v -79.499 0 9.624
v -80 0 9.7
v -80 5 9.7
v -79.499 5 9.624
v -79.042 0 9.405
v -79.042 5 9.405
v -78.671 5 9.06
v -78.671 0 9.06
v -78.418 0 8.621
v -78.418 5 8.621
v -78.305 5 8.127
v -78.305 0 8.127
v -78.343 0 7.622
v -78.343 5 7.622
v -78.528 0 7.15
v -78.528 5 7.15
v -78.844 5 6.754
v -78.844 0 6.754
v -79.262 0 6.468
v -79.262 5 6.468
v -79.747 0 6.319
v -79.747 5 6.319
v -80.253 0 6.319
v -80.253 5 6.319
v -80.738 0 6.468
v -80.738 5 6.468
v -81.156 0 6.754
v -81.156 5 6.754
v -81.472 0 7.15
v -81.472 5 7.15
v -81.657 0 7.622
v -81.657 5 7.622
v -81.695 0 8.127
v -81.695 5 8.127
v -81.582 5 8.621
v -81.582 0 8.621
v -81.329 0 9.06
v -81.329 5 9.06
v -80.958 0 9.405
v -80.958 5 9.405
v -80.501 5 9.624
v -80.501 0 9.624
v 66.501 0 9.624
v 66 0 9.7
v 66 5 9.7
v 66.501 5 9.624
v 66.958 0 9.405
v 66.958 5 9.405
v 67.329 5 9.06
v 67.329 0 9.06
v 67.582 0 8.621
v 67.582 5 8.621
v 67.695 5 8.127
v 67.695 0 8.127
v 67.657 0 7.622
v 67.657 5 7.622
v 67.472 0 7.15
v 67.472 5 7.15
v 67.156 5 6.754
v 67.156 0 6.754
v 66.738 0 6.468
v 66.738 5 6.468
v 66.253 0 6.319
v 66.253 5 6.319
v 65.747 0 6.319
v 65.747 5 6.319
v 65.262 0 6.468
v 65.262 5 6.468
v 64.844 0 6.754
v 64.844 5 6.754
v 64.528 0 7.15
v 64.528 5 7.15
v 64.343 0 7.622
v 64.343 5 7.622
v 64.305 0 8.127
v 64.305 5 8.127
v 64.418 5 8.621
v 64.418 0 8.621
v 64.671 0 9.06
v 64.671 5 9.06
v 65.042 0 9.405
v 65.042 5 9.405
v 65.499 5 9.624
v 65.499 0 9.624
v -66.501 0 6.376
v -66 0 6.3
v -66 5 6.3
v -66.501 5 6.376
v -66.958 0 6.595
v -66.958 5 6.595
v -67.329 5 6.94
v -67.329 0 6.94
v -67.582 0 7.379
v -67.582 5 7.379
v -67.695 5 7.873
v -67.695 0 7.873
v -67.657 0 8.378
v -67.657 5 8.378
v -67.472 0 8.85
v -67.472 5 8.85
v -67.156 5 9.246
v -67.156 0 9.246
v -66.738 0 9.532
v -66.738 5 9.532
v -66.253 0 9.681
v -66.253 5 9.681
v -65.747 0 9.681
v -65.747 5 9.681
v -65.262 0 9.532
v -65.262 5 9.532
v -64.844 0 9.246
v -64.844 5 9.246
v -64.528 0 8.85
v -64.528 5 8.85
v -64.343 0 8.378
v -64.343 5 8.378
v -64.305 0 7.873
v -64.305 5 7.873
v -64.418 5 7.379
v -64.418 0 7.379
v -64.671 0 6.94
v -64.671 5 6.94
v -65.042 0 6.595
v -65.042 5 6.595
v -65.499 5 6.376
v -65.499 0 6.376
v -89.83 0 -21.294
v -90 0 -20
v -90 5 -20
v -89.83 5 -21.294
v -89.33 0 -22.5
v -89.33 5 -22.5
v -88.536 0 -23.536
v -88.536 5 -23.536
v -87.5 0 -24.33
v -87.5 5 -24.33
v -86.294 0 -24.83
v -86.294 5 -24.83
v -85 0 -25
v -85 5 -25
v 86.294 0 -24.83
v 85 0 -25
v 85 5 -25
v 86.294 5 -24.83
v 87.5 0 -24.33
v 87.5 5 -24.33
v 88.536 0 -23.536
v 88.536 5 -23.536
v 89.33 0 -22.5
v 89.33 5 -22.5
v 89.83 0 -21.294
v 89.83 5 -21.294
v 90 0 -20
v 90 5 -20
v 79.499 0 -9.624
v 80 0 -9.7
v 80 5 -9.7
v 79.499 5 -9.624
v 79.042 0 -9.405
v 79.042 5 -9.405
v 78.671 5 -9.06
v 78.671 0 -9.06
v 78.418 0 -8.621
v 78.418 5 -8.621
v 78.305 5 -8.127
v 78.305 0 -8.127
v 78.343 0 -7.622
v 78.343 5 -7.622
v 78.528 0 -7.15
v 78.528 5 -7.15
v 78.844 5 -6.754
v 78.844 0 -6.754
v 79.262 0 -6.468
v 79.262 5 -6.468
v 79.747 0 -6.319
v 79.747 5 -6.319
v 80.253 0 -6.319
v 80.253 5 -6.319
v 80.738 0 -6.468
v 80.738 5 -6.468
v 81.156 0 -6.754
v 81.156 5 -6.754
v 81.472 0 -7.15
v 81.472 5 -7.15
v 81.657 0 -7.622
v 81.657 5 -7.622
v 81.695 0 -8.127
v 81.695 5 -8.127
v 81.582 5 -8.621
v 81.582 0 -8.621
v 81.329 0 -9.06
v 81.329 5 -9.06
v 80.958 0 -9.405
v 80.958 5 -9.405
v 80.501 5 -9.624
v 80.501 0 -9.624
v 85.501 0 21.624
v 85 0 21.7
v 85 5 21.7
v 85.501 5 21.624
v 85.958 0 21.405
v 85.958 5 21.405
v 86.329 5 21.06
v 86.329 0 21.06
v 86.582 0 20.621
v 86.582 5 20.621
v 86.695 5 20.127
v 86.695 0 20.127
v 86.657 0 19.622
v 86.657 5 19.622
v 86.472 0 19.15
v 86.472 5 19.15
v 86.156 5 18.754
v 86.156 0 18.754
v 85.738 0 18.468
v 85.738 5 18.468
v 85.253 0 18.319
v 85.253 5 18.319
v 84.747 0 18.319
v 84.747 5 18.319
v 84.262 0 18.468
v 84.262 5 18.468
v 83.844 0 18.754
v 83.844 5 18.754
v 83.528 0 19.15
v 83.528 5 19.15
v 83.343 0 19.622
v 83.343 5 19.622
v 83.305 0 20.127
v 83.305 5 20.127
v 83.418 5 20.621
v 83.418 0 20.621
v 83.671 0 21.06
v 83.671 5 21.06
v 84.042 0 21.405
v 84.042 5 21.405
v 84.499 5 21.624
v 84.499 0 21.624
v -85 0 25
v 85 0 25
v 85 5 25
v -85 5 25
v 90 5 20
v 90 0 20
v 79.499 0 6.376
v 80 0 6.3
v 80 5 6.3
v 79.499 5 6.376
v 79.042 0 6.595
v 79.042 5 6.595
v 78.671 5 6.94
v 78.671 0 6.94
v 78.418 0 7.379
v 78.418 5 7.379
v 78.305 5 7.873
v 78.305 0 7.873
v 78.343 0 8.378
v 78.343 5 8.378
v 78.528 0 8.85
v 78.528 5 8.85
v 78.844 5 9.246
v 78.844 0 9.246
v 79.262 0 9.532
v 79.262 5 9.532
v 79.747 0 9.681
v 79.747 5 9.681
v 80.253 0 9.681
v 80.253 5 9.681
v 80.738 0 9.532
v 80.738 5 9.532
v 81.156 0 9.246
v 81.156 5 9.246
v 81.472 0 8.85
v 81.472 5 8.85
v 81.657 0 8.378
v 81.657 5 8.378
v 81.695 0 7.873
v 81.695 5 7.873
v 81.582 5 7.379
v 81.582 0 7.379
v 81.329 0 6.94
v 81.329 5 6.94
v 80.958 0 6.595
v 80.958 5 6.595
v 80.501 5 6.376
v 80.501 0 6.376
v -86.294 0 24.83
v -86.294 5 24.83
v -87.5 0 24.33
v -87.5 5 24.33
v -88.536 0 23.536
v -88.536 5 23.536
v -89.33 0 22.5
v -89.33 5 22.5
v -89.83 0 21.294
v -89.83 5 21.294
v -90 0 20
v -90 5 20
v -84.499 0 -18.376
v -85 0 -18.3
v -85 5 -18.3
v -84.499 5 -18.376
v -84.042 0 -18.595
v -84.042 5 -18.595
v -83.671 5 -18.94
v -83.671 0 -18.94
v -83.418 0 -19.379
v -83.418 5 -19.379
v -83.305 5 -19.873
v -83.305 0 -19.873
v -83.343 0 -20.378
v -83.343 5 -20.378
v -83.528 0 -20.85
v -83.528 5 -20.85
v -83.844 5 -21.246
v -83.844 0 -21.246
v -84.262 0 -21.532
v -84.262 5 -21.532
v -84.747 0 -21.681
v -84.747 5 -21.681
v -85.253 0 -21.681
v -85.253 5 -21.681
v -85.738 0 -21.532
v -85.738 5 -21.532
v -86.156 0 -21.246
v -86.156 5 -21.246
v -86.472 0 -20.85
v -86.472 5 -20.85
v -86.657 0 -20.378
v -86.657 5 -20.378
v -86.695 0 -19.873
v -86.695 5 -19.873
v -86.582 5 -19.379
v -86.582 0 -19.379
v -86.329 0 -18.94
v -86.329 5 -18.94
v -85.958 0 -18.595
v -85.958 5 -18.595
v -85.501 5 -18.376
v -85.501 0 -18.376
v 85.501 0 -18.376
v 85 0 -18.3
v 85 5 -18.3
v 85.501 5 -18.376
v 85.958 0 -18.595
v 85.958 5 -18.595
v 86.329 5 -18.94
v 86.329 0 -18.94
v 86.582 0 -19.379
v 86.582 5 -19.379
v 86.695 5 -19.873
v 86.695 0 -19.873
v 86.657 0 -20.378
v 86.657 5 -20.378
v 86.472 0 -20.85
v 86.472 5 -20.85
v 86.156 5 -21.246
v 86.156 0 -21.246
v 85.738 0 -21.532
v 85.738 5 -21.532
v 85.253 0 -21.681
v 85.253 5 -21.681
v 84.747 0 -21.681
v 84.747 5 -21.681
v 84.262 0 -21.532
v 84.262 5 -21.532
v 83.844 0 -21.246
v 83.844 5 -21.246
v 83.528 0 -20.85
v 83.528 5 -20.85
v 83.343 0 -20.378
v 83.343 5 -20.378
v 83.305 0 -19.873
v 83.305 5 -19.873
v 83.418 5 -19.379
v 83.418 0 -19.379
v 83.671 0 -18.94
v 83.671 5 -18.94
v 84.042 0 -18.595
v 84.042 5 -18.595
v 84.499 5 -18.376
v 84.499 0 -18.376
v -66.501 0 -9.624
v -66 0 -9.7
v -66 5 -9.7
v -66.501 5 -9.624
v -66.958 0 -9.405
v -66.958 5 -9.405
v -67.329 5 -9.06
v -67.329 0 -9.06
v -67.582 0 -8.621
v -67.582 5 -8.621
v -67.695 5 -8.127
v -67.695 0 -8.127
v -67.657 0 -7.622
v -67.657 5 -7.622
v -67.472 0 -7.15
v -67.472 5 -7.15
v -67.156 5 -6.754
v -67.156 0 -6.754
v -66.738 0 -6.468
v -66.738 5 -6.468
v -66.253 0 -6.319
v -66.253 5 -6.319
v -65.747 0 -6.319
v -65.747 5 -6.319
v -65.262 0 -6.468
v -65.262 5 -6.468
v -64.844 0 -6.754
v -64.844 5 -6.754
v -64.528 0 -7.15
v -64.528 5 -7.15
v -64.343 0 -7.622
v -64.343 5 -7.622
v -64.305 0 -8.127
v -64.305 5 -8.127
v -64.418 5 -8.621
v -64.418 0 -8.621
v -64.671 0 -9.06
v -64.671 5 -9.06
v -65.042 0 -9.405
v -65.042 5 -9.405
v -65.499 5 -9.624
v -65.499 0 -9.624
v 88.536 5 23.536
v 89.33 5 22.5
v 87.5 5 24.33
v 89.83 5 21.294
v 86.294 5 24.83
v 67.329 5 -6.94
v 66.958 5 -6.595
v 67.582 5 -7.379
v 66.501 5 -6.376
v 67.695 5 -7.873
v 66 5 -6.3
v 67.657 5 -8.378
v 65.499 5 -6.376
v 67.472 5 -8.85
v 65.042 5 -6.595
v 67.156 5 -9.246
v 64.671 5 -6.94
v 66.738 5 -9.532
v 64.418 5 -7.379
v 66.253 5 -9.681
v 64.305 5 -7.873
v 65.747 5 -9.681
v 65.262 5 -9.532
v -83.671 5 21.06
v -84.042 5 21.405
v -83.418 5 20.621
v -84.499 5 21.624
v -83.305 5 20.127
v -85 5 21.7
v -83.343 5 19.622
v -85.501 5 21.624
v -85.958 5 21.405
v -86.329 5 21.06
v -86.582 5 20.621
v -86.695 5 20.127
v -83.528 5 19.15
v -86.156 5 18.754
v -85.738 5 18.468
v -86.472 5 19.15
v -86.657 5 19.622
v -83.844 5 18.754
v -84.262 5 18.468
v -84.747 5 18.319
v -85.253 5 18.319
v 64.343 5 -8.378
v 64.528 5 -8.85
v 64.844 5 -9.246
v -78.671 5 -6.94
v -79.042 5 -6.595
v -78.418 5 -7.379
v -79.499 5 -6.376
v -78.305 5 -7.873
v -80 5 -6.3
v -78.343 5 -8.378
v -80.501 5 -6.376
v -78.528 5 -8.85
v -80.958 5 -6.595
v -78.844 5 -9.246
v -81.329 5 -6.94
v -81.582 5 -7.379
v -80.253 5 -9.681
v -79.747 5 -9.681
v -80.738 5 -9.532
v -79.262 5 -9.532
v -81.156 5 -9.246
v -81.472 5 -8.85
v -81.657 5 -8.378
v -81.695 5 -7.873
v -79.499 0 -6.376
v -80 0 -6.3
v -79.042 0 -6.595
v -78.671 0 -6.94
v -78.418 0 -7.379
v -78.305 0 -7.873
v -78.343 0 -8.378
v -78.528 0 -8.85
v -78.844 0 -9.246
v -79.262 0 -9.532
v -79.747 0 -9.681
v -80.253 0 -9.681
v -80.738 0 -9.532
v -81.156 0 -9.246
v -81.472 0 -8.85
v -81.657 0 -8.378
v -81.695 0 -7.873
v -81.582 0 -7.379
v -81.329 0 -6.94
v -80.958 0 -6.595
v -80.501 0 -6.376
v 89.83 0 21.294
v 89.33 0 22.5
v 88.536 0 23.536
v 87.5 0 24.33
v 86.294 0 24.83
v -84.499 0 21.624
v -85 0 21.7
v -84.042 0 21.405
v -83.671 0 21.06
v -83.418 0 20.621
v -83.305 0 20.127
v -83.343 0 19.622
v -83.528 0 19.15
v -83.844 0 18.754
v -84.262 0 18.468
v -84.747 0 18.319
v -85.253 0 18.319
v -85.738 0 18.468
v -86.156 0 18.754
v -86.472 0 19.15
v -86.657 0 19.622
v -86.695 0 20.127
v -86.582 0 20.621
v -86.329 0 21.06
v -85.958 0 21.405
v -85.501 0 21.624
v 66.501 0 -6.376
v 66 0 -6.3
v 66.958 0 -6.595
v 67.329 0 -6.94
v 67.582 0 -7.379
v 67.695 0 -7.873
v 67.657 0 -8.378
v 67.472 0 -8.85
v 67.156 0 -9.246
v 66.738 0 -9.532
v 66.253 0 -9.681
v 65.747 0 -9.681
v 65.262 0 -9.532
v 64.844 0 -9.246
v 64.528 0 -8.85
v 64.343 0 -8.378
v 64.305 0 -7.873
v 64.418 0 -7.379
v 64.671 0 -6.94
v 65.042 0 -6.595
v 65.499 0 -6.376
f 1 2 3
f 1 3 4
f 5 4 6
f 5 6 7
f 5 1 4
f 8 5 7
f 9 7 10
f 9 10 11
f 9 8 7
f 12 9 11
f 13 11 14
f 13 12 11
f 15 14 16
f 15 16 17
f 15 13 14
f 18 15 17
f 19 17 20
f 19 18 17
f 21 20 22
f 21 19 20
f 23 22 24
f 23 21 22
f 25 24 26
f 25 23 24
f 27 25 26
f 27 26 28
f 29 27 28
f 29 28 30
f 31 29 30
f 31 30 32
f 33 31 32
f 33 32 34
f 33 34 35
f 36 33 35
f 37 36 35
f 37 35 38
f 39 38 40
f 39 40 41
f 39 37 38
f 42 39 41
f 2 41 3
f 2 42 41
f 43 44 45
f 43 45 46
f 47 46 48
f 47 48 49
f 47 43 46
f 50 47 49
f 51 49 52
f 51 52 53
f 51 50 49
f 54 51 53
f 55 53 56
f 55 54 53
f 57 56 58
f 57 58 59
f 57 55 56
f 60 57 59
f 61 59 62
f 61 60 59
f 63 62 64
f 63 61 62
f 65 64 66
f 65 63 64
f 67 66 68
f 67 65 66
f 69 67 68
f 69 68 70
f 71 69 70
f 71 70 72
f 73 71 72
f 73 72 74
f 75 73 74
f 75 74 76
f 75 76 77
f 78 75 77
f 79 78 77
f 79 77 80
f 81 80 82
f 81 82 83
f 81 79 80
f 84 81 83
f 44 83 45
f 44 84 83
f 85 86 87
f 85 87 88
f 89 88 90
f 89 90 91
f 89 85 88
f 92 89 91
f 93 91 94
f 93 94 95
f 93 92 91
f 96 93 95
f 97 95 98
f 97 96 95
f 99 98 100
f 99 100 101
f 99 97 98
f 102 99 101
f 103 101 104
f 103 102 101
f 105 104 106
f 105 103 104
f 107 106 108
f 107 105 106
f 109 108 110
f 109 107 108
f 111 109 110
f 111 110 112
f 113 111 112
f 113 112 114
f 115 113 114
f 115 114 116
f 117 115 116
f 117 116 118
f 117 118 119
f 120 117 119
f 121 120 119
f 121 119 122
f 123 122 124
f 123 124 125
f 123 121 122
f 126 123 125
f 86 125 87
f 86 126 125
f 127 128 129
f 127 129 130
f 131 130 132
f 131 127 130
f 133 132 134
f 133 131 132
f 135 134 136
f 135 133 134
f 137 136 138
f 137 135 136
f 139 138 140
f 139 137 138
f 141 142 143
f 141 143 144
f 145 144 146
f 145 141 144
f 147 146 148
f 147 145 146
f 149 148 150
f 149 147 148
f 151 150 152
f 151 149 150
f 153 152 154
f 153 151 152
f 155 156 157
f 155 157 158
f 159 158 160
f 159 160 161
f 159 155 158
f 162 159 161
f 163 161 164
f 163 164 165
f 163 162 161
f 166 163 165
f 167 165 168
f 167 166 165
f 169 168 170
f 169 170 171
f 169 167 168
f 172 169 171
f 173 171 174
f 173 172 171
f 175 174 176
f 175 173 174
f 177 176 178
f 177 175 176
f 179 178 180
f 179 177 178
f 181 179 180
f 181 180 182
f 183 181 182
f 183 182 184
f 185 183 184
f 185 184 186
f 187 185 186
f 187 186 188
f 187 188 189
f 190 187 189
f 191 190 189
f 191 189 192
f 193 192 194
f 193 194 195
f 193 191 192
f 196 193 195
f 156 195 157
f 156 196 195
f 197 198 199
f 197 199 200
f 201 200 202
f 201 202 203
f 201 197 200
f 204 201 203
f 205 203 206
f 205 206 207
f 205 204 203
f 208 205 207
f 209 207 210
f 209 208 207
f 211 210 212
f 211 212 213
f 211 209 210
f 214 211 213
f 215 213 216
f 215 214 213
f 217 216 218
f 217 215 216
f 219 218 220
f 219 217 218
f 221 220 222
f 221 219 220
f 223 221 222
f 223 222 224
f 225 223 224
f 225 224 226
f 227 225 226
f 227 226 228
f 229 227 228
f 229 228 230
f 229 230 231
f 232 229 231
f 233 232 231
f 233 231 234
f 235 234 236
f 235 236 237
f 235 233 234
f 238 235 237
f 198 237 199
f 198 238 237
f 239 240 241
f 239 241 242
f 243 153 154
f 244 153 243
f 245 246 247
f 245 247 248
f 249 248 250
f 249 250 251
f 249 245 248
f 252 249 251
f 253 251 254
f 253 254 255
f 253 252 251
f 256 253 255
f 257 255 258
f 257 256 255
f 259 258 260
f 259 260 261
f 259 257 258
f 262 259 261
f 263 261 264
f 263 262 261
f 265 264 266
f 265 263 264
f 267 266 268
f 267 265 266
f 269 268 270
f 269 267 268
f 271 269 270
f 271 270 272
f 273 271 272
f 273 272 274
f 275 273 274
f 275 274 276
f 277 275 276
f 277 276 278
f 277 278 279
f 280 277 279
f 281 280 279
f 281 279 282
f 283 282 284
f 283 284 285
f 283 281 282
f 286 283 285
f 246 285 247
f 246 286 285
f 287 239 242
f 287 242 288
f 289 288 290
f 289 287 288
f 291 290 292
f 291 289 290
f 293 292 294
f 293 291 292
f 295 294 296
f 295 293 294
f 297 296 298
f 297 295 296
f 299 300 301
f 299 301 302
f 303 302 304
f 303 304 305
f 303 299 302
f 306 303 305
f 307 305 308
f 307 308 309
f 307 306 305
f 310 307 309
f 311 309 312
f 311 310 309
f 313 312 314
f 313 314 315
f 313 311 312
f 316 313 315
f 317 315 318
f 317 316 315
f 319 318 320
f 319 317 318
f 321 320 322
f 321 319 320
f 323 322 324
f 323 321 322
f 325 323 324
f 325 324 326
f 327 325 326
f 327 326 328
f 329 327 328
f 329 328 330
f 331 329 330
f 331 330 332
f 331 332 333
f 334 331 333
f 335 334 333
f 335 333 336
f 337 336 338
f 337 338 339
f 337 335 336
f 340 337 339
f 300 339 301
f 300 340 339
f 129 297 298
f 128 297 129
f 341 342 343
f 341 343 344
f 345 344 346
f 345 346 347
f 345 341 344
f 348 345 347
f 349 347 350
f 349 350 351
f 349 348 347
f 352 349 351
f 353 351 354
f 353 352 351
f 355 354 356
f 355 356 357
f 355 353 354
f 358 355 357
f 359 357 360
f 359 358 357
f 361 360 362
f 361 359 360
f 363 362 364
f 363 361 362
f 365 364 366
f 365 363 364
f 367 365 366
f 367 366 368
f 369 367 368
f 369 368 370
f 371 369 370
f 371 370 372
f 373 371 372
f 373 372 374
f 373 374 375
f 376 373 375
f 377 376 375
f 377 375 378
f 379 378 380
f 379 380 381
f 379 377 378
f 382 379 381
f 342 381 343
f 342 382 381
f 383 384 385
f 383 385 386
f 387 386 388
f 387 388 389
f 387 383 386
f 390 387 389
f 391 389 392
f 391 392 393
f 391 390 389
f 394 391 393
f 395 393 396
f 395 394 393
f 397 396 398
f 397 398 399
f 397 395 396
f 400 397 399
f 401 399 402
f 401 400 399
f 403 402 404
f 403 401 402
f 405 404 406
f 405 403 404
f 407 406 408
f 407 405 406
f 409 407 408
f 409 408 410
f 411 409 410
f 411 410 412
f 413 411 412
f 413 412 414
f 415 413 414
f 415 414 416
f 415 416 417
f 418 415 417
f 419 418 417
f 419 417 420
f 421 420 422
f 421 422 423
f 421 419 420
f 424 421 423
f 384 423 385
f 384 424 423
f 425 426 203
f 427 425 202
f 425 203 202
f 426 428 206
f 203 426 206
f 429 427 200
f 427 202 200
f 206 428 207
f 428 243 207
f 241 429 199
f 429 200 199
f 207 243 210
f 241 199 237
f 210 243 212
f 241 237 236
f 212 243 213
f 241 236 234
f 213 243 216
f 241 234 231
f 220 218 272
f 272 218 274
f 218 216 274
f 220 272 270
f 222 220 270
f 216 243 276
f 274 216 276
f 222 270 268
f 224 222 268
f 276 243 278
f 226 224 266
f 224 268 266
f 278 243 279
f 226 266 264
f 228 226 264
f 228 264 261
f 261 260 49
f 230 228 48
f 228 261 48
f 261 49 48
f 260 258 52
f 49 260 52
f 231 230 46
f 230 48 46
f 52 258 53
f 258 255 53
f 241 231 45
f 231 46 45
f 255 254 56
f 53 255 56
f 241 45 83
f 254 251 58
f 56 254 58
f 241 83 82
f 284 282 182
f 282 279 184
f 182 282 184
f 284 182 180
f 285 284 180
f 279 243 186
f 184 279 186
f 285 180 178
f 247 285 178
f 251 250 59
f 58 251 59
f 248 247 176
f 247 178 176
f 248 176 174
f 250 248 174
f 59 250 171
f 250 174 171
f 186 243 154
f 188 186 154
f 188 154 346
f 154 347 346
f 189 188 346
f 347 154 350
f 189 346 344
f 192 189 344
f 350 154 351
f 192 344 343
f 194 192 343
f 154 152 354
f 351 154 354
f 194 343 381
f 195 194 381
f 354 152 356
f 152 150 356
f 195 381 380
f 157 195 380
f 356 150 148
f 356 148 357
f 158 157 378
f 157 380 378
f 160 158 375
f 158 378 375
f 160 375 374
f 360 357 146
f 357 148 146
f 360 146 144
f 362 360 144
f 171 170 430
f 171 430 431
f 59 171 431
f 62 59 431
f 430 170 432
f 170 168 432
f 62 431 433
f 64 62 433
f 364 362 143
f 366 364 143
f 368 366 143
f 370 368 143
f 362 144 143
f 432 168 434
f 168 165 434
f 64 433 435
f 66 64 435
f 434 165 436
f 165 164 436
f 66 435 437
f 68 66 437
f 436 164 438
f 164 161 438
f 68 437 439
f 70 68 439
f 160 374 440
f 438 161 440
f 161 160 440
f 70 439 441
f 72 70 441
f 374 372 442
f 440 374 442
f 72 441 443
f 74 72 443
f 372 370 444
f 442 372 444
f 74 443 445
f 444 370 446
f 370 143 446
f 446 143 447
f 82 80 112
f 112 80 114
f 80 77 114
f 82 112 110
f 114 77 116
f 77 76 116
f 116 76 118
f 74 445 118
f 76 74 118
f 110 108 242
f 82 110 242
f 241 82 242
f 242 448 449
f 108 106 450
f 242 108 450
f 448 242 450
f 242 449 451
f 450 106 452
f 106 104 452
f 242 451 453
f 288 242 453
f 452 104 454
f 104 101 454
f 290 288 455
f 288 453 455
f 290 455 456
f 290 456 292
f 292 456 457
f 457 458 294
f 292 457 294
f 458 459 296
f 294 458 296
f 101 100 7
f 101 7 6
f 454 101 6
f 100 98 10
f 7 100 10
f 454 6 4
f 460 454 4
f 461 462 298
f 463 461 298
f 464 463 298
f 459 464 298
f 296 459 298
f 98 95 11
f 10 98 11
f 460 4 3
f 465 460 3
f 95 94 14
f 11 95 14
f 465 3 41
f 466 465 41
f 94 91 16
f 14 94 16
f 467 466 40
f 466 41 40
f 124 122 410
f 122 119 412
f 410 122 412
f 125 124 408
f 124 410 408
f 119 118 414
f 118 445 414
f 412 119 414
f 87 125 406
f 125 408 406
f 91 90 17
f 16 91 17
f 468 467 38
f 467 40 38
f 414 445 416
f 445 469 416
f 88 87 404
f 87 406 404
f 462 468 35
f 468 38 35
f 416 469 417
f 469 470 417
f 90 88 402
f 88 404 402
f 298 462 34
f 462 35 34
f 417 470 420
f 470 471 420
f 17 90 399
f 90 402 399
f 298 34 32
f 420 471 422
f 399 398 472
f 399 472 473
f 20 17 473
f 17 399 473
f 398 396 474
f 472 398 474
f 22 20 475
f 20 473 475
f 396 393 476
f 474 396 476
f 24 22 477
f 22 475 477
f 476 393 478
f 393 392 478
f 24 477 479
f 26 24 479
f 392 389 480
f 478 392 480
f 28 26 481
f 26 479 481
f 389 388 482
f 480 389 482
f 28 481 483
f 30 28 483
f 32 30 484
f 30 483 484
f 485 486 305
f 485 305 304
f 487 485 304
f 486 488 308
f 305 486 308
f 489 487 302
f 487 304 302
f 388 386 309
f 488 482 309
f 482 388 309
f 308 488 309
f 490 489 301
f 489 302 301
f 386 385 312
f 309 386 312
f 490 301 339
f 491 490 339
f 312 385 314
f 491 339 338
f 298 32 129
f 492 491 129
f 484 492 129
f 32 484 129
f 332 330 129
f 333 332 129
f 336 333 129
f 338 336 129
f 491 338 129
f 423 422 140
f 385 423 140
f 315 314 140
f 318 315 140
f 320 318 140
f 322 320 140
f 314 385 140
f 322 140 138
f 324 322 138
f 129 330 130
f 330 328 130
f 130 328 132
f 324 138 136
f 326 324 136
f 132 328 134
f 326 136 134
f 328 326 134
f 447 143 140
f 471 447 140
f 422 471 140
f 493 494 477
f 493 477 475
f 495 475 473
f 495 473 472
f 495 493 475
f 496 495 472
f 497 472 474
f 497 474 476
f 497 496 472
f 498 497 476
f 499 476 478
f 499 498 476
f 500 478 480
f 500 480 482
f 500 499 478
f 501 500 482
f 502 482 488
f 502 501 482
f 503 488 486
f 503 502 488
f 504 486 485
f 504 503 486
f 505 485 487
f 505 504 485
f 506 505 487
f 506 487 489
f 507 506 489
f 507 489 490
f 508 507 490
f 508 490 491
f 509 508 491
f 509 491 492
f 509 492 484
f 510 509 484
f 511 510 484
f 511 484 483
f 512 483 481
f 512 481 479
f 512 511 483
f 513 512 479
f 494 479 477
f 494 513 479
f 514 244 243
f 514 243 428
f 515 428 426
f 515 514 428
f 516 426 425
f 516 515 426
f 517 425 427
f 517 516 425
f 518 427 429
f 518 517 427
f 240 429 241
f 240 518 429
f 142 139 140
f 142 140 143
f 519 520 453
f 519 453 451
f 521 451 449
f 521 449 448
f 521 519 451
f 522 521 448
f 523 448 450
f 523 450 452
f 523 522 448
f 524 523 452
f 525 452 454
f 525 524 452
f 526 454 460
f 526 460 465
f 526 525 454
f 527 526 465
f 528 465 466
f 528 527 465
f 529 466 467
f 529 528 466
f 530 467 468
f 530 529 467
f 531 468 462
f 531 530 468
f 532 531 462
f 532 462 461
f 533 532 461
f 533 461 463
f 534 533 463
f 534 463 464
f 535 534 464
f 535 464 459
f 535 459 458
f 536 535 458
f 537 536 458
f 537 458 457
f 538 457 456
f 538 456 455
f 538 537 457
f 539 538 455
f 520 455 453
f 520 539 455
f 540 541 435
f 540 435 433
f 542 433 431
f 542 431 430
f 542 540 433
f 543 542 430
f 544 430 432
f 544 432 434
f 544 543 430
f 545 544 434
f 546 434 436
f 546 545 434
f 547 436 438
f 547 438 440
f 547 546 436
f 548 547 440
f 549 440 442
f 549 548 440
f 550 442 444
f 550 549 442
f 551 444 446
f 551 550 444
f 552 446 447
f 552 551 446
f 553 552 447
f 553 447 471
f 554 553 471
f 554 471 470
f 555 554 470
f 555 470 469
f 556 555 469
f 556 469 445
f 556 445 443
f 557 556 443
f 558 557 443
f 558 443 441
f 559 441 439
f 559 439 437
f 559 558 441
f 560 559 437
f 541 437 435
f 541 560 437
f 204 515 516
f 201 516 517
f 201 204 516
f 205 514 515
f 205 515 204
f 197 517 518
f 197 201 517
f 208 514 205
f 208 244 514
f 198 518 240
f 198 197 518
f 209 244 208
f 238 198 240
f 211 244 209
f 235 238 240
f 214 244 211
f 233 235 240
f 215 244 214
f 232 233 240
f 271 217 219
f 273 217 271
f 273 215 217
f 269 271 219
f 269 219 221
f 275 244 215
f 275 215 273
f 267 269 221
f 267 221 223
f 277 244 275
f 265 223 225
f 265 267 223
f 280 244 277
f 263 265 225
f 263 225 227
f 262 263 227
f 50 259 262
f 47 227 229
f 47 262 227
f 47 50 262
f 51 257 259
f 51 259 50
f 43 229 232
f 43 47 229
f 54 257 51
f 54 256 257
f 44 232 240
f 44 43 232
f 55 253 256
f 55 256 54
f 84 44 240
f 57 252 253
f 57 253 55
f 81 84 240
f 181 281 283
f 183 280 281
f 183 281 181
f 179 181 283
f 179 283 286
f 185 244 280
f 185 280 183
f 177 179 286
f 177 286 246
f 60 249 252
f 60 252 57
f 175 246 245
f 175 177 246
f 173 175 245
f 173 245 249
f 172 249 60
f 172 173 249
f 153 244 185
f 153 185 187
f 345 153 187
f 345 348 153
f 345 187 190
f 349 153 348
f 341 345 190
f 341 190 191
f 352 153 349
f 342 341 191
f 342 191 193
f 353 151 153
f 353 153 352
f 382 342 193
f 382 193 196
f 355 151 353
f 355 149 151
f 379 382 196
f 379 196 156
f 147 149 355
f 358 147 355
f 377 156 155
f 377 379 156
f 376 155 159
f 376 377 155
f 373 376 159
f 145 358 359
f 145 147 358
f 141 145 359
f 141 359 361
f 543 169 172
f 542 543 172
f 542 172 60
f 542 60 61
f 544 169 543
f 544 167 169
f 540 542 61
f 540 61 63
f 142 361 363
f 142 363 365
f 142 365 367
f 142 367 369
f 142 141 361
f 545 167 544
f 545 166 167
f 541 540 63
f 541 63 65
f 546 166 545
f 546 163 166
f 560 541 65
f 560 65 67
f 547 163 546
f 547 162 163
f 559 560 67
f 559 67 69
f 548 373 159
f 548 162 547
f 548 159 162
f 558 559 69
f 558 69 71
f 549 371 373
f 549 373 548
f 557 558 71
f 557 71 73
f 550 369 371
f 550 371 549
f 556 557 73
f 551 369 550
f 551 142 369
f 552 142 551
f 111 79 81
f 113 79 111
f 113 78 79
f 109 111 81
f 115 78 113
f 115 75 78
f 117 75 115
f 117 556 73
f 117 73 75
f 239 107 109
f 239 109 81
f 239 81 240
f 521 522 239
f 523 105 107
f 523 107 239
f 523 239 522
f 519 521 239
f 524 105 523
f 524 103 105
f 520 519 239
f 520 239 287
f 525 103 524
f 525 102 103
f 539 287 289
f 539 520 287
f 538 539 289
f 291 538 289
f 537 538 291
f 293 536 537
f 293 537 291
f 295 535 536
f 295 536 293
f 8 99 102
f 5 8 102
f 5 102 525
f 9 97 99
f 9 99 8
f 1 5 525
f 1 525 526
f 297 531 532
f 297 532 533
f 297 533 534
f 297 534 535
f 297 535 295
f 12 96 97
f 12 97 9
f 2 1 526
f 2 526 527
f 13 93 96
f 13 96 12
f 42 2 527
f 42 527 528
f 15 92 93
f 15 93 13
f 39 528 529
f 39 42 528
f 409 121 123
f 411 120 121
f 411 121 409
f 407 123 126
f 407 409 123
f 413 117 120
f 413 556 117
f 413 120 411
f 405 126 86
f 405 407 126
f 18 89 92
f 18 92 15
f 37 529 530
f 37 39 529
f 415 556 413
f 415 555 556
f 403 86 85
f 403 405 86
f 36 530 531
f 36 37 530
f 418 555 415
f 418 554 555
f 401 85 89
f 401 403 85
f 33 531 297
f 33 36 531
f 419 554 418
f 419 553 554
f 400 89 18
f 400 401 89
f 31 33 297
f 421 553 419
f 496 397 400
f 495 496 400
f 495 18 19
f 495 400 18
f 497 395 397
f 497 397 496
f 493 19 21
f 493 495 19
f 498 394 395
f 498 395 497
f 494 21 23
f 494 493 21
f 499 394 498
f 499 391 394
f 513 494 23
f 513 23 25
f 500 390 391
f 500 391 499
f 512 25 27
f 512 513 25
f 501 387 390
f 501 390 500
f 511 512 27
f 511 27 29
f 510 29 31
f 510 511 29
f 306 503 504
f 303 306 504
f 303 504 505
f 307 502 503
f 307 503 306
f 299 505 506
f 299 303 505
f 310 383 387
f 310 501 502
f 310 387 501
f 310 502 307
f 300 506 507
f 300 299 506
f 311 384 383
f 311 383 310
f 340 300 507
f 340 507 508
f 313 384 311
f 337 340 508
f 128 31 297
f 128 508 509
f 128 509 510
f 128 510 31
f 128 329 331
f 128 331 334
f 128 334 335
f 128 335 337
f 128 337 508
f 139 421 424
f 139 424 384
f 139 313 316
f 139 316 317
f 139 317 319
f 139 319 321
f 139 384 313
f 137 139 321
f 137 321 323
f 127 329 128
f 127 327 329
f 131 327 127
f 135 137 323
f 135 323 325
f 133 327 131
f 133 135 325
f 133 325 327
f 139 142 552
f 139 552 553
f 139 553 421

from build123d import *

# Parameters (mm, degrees)
SKETCH_1_R      = 1.7
EXTRUDE_1_DEPTH = 5


with BuildPart() as part:
    # 草图1 → 凸台-拉伸1 (new body)
    with BuildSketch(Plane(origin=(0, 0, 0), x_dir=(1, 0, 0), z_dir=(0, 1, 0))):
        with BuildLine():
            Line((-85, 25), (85, 25))
            ThreePointArc((85, 25), (88.535533906, 23.535533906), (90, 20))
            Line((90, 20), (90, -20))
            ThreePointArc((90, -20), (88.535533906, -23.535533906), (85, -25))
            Line((85, -25), (-85, -25))
            ThreePointArc((-85, -25), (-88.535533906, -23.535533906), (-90, -20))
            Line((-90, -20), (-90, 20))
            ThreePointArc((-90, 20), (-88.535533906, 23.535533906), (-85, 25))
        make_face()
        with Locations(Location((-85, 20, 0), (0, 0, 270))):
            Circle(SKETCH_1_R, mode=Mode.SUBTRACT)
        with Locations(Location((-85, -20, 0), (0, 0, 270))):
            Circle(SKETCH_1_R, mode=Mode.SUBTRACT)
        with Locations(Location((85, 20, 0), (0, 0, 270))):
            Circle(SKETCH_1_R, mode=Mode.SUBTRACT)
        with Locations(Location((85, -20, 0), (0, 0, 270))):
            Circle(SKETCH_1_R, mode=Mode.SUBTRACT)
        with Locations(Location((-80, 8, 0), (0, 0, 270))):
            Circle(SKETCH_1_R, mode=Mode.SUBTRACT)
        with Locations(Location((-80, -8, 0), (0, 0, 270))):
            Circle(SKETCH_1_R, mode=Mode.SUBTRACT)
        with Locations(Location((-66, -8, 0), (0, 0, 90))):
            Circle(SKETCH_1_R, mode=Mode.SUBTRACT)
        with Locations(Location((-66, 8, 0), (0, 0, 90))):
            Circle(SKETCH_1_R, mode=Mode.SUBTRACT)
        with Locations(Location((66, -8, 0), (0, 0, 270))):
            Circle(SKETCH_1_R, mode=Mode.SUBTRACT)
        with Locations(Location((66, 8, 0), (0, 0, 270))):
            Circle(SKETCH_1_R, mode=Mode.SUBTRACT)
        with Locations(Location((80, -8, 0), (0, 0, 90))):
            Circle(SKETCH_1_R, mode=Mode.SUBTRACT)
        with Locations(Location((80, 8, 0), (0, 0, 90))):
            Circle(SKETCH_1_R, mode=Mode.SUBTRACT)
    extrude(amount=EXTRUDE_1_DEPTH)


solid = part.part
